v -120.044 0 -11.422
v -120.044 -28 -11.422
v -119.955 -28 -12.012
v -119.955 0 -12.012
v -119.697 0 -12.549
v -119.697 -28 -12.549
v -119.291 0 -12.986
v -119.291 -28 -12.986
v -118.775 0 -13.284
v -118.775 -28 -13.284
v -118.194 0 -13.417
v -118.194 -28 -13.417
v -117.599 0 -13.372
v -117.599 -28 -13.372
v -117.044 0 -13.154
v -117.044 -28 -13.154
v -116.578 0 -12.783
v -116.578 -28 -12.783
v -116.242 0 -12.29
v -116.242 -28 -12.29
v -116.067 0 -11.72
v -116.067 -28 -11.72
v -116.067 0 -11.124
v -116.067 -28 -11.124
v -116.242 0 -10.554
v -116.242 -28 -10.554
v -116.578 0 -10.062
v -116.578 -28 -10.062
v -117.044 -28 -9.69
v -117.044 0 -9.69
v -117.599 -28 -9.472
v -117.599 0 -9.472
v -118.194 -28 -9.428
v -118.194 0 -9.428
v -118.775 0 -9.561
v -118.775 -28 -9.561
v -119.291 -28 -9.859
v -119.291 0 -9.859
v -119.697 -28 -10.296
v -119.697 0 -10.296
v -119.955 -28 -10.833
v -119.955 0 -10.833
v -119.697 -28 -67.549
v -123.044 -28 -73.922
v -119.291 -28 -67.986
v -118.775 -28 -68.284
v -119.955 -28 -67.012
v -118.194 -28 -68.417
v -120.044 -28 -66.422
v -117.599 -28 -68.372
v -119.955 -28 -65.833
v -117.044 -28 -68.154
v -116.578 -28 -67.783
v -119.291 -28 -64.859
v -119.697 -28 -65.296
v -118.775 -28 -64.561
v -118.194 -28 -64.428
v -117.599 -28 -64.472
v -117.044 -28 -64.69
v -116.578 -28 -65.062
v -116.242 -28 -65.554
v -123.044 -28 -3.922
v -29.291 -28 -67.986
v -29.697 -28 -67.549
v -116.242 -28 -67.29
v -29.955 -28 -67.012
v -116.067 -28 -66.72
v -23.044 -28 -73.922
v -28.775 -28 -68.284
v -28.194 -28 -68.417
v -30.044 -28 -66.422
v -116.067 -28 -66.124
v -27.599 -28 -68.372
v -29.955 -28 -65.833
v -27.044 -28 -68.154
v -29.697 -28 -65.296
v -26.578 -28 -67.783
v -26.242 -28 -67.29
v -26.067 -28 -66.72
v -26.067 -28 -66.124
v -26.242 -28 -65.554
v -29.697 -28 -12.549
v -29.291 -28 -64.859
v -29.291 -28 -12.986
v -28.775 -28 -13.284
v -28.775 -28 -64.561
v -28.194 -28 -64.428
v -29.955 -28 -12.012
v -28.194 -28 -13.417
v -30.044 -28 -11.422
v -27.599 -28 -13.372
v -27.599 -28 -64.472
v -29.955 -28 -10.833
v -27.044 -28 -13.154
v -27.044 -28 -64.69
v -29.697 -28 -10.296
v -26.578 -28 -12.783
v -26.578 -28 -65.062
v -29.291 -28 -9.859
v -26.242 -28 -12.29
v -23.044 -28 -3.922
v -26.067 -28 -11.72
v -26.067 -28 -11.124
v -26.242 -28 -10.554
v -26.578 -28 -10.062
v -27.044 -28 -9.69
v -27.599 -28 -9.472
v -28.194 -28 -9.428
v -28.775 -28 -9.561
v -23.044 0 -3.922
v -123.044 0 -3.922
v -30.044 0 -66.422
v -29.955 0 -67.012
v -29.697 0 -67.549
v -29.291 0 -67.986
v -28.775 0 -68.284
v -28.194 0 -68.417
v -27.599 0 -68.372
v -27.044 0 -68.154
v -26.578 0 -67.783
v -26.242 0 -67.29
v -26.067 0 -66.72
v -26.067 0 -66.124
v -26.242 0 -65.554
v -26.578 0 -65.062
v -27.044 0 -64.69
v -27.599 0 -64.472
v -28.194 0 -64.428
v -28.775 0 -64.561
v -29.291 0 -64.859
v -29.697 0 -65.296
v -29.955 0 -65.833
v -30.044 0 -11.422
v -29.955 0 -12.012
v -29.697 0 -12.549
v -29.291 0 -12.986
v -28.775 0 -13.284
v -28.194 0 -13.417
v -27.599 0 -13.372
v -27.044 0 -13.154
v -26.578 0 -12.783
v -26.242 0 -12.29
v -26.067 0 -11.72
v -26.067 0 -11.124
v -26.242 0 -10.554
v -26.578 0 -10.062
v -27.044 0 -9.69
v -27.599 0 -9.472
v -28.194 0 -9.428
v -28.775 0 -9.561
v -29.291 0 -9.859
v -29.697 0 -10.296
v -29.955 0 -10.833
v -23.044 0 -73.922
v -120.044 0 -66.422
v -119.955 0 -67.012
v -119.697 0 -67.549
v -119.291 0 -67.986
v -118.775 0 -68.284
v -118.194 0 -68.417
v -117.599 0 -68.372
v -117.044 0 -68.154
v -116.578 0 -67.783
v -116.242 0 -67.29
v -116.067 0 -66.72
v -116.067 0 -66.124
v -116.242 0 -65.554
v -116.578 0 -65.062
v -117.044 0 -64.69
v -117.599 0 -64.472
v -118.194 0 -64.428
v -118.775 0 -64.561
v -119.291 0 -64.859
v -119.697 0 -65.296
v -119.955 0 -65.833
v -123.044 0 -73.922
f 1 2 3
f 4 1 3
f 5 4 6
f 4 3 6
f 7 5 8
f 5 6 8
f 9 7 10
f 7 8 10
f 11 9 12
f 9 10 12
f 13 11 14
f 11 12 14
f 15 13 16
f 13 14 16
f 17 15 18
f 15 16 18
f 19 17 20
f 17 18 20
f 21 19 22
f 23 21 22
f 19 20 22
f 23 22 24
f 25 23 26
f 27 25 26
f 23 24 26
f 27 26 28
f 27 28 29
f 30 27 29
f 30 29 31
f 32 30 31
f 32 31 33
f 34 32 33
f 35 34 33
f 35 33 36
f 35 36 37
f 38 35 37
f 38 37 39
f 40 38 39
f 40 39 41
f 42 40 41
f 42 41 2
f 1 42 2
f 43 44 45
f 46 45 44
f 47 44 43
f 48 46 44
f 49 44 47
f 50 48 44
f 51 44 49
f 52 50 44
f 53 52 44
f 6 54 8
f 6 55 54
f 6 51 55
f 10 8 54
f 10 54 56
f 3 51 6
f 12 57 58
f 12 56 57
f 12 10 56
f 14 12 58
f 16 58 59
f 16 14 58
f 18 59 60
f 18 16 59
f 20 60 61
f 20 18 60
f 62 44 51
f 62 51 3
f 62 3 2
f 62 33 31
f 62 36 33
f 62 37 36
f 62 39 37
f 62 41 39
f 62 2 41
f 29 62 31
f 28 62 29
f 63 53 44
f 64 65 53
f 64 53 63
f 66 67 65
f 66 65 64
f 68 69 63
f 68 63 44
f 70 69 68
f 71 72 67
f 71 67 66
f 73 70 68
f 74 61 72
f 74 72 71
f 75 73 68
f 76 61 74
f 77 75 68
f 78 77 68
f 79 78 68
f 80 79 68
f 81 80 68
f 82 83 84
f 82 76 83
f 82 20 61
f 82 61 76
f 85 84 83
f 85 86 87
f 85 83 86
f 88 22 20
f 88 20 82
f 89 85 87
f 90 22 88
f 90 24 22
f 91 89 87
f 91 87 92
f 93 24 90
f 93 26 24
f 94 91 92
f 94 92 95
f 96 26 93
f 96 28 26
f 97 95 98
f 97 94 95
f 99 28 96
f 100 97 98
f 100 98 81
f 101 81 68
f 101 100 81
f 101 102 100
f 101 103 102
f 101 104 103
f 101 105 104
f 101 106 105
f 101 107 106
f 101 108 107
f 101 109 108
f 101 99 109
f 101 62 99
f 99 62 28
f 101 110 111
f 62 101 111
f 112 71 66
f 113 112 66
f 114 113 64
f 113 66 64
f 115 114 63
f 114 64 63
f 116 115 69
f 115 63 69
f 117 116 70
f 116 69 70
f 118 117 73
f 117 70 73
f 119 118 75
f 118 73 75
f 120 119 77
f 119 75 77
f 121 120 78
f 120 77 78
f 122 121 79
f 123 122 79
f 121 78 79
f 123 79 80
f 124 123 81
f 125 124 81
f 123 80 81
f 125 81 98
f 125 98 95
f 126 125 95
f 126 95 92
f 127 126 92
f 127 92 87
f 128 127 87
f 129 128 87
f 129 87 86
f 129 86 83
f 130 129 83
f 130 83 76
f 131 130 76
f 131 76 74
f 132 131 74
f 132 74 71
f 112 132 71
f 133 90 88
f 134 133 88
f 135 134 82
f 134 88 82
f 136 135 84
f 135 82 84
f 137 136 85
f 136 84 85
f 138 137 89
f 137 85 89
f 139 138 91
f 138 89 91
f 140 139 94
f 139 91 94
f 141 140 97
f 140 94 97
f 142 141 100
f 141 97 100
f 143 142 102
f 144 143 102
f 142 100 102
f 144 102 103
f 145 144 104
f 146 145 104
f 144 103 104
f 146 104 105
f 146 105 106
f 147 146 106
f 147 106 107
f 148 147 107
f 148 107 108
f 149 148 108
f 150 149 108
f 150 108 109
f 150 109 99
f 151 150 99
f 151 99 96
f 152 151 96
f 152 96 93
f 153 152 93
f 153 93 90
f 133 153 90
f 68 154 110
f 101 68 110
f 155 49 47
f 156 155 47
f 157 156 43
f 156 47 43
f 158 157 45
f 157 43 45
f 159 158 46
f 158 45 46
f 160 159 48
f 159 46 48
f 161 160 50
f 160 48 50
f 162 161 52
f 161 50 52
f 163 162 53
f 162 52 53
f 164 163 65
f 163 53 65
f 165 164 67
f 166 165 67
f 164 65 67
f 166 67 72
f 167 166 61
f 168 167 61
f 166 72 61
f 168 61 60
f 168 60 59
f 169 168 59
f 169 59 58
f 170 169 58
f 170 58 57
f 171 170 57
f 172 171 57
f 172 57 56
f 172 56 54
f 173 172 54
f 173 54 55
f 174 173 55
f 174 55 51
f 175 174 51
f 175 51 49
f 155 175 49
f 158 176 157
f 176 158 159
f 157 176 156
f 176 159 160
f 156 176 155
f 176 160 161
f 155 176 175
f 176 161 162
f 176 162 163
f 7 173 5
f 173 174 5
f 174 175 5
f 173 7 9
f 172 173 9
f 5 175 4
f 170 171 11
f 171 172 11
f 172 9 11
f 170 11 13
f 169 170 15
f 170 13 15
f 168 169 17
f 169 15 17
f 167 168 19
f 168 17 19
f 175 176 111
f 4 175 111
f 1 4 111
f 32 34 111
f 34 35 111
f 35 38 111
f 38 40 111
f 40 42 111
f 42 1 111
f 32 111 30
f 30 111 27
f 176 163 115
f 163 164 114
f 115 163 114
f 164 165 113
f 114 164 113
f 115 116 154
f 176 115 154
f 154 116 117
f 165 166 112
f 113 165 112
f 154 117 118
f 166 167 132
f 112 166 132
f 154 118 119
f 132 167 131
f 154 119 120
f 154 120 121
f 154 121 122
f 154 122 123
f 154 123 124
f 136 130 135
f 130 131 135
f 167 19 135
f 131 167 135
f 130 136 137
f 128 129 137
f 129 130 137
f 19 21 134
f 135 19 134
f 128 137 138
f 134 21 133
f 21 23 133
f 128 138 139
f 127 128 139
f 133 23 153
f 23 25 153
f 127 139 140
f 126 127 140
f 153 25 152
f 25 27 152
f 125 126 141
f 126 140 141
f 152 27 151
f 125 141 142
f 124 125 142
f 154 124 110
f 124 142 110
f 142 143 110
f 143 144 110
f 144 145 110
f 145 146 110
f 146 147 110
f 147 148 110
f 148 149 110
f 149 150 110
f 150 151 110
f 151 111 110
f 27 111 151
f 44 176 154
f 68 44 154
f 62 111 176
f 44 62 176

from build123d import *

# Parameters (mm, degrees)
F0_W     = 90
F0_H     = 55
F0_H_2   = 7.5
F0_W_2   = 5
F1_DEPTH = 28
F2_D     = 4


with BuildPart() as f1:
    # F0 (on Front) → F1 (new body)
    with BuildSketch(Plane.XZ):
        with Locations((-73.0443269014, -38.9222615957)):
            Rectangle(F0_W, F0_H)
        with Locations((-73.0443269014, -7.6722615957)):
            Rectangle(F0_W, F0_H_2)
        with Locations((-25.5443269014, -38.9222615957)):
            Rectangle(F0_W_2, F0_H)
        with Locations((-25.5443269014, -7.6722615957)):
            Rectangle(F0_W_2, F0_H_2)
        with Locations((-73.0443269014, -70.1722615957)):
            Rectangle(F0_W, F0_H_2)
        with Locations((-120.5443269014, -38.9222615957)):
            Rectangle(F0_W_2, F0_H)
        with Locations((-120.5443269014, -7.6722615957)):
            Rectangle(F0_W_2, F0_H_2)
        with Locations((-120.5443269014, -70.1722615957)):
            Rectangle(F0_W_2, F0_H_2)
        with Locations((-25.5443269014, -70.1722615957)):
            Rectangle(F0_W_2, F0_H_2)
    extrude(amount=F1_DEPTH)

    # F2 (through all)
    with Locations(Plane(origin=(0, 0, 0), x_dir=(1, 0, 0), z_dir=(0, 1, 0))):
        with Locations((-118.0443269014, 11.4222615957), (-28.0443269014, 11.4222615957), (-118.0443269014, 66.4222615957), (-28.0443269014, 66.4222615957)):
            Hole(F2_D / 2)


solid = f1.part
